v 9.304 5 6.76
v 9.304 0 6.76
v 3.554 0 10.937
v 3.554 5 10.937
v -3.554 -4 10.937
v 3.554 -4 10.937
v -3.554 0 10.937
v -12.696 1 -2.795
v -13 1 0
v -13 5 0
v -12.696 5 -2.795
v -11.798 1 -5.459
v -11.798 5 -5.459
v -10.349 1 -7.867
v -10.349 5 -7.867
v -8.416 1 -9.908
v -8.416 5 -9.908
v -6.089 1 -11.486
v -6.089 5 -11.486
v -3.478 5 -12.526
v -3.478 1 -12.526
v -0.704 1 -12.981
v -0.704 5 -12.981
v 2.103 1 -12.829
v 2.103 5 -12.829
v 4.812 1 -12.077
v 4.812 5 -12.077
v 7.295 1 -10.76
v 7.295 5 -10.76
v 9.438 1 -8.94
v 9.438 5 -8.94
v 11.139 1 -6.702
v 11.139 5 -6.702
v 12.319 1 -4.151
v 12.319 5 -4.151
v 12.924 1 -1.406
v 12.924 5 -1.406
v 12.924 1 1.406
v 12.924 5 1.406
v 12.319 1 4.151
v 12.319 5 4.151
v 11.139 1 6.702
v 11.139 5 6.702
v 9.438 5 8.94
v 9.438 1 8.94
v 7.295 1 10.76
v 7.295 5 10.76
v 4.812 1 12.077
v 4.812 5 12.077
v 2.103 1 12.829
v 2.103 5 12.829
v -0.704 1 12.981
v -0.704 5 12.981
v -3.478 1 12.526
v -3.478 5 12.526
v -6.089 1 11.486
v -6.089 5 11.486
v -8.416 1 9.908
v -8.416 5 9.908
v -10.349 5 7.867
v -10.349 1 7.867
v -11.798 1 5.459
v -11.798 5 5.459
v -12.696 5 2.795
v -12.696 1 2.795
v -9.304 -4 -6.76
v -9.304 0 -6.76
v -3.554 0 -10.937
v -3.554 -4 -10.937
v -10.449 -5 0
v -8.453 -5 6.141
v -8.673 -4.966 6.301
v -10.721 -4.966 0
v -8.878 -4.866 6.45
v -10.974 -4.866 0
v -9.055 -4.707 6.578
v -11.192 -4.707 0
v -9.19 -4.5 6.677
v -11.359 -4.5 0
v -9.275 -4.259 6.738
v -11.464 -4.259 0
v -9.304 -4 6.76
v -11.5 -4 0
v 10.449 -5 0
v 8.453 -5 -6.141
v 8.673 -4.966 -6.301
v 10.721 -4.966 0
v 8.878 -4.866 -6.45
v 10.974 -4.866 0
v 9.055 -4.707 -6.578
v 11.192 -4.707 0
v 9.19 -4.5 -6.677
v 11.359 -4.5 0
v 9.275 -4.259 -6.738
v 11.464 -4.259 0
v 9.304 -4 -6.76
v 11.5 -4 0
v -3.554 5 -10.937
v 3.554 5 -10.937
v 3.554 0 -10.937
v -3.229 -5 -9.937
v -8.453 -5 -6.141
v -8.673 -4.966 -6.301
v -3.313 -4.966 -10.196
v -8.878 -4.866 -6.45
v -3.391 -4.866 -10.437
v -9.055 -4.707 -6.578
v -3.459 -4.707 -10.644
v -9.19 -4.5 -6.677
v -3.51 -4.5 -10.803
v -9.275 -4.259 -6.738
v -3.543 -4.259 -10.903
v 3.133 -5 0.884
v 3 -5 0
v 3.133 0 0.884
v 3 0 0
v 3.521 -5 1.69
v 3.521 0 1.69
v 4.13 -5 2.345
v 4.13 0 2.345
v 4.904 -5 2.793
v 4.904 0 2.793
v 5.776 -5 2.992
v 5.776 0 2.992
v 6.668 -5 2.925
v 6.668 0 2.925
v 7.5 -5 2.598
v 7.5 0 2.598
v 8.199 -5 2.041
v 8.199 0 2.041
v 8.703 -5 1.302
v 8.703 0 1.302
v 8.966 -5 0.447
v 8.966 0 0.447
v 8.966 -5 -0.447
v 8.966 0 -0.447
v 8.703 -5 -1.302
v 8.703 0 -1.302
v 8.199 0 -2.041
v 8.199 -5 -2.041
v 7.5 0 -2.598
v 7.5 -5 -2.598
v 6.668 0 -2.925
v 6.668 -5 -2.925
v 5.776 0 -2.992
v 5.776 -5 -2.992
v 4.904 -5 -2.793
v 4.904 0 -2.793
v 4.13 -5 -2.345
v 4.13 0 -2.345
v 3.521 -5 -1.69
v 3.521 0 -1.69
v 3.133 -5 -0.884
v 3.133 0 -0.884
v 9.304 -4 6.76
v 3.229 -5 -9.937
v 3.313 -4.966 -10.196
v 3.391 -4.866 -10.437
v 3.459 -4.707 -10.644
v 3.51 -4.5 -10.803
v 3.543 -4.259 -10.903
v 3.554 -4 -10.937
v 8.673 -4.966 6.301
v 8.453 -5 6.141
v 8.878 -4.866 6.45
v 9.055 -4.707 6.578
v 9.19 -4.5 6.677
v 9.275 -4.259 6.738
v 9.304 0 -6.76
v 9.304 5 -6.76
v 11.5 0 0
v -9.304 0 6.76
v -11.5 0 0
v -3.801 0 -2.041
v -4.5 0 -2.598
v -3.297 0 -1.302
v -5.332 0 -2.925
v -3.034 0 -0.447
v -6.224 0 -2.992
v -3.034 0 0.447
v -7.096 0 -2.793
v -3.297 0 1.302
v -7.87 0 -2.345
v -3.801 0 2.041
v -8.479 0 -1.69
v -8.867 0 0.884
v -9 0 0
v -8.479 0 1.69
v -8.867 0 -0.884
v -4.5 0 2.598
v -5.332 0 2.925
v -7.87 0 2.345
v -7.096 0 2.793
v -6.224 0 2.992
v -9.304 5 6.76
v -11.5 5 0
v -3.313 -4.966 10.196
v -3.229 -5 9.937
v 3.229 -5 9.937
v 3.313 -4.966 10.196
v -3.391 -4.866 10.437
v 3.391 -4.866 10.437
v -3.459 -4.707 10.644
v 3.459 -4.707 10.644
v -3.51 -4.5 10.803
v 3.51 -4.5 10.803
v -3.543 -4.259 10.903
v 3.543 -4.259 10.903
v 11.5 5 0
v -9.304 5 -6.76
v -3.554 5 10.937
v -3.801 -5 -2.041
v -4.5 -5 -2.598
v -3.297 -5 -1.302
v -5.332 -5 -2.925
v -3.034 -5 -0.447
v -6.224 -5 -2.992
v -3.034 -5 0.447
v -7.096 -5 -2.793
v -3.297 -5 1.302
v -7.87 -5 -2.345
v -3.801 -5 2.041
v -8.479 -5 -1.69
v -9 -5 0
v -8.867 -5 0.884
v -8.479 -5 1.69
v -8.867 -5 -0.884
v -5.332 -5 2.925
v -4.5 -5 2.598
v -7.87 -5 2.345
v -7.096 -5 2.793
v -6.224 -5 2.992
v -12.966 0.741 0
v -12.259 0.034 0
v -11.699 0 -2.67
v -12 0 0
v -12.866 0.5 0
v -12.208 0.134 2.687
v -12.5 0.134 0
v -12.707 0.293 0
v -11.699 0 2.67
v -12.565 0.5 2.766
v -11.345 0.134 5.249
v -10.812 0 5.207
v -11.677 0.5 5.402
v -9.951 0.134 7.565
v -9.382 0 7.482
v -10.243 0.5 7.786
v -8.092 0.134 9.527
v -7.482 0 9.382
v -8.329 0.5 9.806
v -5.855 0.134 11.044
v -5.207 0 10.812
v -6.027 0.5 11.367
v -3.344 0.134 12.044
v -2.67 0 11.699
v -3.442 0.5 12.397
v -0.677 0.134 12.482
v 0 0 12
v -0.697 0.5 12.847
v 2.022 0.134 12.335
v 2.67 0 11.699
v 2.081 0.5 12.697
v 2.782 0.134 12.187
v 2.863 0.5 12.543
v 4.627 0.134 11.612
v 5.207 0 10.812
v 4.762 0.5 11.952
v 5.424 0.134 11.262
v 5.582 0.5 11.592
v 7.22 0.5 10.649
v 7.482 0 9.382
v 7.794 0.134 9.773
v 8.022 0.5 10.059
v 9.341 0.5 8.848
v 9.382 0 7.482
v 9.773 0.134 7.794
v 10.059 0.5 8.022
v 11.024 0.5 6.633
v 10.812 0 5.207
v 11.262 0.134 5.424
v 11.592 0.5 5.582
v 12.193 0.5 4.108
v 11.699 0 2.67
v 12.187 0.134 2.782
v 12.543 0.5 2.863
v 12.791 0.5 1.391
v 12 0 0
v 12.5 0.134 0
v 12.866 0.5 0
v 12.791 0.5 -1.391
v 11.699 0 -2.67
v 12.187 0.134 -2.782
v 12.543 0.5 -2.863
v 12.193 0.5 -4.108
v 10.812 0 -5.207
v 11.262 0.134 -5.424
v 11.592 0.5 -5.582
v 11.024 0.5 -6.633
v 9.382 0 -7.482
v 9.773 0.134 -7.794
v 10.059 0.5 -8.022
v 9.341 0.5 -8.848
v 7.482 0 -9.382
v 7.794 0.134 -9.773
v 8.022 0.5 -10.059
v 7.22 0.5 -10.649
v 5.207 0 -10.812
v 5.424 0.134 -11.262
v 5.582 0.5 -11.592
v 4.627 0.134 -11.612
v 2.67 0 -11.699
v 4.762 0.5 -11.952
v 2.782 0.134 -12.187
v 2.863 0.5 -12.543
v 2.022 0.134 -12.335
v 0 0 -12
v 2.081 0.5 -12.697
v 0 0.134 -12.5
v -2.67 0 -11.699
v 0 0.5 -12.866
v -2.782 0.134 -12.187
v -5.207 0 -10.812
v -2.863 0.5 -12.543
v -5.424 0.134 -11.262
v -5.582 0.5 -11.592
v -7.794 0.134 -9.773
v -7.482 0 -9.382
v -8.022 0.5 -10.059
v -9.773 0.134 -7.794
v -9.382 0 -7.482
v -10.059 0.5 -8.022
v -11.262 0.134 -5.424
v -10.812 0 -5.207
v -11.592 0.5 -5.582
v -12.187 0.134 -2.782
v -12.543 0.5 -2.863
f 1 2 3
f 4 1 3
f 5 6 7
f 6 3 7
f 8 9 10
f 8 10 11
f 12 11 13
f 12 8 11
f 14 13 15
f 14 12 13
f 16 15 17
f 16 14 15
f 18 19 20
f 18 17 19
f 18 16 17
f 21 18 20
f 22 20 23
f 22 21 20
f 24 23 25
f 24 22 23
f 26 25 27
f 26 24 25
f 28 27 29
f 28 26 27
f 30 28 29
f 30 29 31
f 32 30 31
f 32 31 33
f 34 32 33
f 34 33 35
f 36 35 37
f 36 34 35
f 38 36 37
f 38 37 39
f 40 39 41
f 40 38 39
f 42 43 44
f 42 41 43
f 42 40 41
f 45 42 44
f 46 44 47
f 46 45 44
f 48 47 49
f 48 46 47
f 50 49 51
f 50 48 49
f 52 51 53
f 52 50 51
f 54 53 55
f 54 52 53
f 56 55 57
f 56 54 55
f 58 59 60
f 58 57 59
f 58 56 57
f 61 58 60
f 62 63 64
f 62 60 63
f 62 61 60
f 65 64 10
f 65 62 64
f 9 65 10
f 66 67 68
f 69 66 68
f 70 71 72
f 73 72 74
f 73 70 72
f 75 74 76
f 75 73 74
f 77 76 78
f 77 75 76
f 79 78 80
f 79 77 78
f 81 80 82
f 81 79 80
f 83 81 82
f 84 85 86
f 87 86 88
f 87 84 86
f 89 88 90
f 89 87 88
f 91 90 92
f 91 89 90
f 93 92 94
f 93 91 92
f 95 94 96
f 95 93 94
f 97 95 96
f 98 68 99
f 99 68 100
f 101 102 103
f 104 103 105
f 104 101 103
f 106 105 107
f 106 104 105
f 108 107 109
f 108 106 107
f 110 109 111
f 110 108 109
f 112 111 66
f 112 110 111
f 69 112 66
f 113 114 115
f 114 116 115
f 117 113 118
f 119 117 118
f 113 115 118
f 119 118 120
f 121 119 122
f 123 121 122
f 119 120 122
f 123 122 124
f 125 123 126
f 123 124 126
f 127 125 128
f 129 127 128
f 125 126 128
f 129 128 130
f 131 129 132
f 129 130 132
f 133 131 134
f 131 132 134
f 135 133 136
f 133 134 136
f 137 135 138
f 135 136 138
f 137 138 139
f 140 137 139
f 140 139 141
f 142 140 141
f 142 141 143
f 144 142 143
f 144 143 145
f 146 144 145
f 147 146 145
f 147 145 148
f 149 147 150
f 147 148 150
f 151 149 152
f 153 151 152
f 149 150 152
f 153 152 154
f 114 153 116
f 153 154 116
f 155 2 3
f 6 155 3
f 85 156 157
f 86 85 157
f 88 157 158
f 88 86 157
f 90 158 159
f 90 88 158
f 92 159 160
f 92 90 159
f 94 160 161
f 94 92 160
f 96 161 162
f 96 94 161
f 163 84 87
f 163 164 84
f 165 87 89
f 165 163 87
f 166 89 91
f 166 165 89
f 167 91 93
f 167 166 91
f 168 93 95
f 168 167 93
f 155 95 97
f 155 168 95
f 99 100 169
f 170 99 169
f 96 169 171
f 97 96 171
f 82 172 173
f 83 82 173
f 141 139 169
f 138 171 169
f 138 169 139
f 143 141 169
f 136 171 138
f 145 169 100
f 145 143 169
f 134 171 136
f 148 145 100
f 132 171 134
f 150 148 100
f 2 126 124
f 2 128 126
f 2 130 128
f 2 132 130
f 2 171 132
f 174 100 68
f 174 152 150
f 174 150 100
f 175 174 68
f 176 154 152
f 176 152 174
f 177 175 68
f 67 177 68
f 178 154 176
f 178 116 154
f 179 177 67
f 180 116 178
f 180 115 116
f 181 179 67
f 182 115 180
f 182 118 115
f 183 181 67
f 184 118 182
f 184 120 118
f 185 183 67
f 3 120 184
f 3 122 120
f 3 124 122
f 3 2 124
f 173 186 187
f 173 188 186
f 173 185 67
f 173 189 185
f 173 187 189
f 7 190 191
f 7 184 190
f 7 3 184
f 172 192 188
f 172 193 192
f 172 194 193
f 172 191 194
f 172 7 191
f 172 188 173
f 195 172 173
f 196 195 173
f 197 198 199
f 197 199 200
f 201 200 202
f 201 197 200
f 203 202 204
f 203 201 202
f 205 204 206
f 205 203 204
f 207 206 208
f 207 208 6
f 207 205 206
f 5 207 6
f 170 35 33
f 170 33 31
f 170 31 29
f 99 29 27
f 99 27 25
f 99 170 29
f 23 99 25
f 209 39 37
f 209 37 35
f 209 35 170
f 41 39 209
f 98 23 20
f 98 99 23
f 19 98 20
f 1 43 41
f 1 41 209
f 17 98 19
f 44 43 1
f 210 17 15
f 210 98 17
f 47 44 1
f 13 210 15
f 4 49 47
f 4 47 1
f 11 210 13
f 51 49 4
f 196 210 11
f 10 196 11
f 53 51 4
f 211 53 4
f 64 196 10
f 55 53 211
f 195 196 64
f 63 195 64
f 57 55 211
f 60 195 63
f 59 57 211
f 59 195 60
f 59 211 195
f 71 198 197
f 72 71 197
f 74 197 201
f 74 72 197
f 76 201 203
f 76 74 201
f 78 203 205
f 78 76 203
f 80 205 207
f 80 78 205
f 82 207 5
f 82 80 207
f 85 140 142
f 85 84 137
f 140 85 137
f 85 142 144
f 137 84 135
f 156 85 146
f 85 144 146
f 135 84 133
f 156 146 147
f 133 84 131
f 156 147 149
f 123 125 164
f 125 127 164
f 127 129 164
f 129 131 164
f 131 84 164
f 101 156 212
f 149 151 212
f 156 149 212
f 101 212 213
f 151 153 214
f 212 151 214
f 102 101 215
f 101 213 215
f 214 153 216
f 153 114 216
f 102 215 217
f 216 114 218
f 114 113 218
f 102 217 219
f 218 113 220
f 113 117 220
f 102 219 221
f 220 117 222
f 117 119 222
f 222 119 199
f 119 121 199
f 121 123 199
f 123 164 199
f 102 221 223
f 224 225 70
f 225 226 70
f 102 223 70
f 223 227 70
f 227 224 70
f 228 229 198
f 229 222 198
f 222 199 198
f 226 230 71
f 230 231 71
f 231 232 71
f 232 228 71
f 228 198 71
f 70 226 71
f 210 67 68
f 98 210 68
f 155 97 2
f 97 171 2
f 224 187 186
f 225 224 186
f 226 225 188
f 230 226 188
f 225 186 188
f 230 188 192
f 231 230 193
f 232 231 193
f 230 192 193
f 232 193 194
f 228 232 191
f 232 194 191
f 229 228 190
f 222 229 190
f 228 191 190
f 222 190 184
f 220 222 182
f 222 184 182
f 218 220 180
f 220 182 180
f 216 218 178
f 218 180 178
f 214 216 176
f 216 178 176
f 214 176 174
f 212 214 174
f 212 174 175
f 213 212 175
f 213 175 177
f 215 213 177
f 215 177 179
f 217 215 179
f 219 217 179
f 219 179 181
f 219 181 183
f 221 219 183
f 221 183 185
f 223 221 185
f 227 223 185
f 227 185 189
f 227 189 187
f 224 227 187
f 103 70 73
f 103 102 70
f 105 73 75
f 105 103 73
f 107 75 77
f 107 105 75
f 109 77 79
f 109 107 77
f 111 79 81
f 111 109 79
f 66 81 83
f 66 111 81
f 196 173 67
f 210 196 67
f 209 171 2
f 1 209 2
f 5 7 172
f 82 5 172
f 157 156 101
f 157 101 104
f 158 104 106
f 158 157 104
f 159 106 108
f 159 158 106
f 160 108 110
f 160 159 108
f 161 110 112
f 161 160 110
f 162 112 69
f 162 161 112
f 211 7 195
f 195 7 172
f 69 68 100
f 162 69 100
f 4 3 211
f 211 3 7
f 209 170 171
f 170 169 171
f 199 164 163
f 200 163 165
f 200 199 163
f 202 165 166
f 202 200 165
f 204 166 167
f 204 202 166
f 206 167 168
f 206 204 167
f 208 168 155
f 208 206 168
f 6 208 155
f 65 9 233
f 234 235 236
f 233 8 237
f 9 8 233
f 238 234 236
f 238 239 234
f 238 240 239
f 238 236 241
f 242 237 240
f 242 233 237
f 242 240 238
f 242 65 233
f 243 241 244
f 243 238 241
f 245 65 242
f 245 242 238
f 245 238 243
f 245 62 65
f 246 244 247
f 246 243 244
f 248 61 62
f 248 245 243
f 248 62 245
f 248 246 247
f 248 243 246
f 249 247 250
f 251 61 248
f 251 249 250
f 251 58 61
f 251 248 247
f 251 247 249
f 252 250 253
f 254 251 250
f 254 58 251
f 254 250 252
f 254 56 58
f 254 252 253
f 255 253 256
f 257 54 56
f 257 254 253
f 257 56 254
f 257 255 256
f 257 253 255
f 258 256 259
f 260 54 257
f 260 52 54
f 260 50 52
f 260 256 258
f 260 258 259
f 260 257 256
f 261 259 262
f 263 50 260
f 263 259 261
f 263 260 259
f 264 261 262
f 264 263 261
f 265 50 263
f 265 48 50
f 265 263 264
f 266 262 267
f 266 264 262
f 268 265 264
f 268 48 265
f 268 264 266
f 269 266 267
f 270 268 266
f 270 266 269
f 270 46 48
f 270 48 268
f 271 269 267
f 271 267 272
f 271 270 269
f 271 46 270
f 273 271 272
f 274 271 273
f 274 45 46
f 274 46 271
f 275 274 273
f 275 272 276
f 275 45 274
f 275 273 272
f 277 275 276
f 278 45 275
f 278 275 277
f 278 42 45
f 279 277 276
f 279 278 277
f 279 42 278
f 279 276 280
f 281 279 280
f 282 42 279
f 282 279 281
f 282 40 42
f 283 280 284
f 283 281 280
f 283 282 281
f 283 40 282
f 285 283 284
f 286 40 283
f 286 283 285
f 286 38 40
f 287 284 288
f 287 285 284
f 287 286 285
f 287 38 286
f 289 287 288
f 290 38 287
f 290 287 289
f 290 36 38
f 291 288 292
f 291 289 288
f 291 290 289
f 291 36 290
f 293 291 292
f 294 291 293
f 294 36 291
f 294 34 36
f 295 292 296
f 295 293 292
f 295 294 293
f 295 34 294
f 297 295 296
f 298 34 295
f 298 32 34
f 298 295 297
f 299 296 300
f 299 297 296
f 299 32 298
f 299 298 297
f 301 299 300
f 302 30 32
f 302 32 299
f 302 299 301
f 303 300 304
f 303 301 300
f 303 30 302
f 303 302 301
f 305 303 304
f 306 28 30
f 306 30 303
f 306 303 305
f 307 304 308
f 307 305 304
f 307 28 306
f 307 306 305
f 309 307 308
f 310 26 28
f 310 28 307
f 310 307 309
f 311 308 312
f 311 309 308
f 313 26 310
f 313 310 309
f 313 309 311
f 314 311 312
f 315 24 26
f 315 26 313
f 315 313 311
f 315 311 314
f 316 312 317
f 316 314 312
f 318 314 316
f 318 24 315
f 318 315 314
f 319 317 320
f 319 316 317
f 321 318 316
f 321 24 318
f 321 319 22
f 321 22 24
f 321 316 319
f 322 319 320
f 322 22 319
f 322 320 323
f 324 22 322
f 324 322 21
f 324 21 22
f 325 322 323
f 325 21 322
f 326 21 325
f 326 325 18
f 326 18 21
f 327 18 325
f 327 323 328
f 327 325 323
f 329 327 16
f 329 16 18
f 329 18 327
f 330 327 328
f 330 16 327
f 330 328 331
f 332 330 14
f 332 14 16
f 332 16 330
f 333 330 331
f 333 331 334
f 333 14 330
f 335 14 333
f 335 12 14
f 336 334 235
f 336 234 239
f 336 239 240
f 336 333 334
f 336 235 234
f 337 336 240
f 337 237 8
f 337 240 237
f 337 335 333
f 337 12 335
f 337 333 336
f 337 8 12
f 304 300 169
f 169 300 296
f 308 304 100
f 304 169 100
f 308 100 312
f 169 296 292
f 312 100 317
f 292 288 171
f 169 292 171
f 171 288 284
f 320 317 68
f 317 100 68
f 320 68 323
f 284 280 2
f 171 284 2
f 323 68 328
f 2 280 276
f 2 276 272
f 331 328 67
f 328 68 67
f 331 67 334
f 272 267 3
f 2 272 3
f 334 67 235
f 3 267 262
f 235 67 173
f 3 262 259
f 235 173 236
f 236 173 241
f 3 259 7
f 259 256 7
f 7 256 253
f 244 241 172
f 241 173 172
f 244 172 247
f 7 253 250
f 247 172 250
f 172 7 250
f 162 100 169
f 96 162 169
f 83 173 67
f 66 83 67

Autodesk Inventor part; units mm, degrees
ref_plane "YZ Plane" through (0, 0, 0) normal (1, 0, 0) x (0, 1, 0)
ref_plane "XZ Plane" through (0, 0, 0) normal (0, 1, 0) x (-1, 0, 0)
ref_plane "XY Plane" through (0, 0, 0) normal (0, 0, 1) x (1, 0, 0)
sketch "Sketch1" plane through (0, 0, 0) normal (0, 1, 0) x (-1, 0, 0)
  circle A0 centre (0, 0) radius 13
  line L0 (-11.5, 0) -> (-9.3037, 6.7595)
  line L1 (-9.3037, 6.7595) -> (-3.5537, 10.9371)
  line L2 (-3.5537, 10.9371) -> (3.5537, 10.9371)
  line L3 (3.5537, 10.9371) -> (9.3037, 6.7595)
  line L4 (9.3037, 6.7595) -> (11.5, 0)
  line L5 (11.5, 0) -> (9.3037, -6.7595)
  line L6 (9.3037, -6.7595) -> (3.5537, -10.9371)
  line L7 (3.5537, -10.9371) -> (-3.5537, -10.9371)
  line L8 (-3.5537, -10.9371) -> (-9.3037, -6.7595)
  line L9 (-9.3037, -6.7595) -> (-11.5, 0)
  circle A1 centre (-6, 0) radius 3
  circle A2 centre (6, 0) radius 3
  dimension "d0" = 26
  dimension "d10" = 6
  dimension "d11" = 6
extrude "Extrusion1" add sketch "Sketch1" against normal blind 5 contours L0 L1 L2 L3 L4 L5 L6 L7 L8 L9
extrude "Extrusion2" add sketch "Sketch1" along normal blind 5 contours A0
fillet "Fillet1" radius 1 11 edges at (13, 0, 0) (-6.4287, -5, -8.8483) (0, -5, -10.9371) (-10.4018, -5, -3.3798) (-10.4018, -5, 3.3798) (-6.4287, -5, 8.8483) (0, -5, 10.9371) (6.4287, -5, 8.8483) (10.4018, -5, 3.3798) (10.4018, -5, -3.3798) (6.4287, -5, -8.8483)
properties part number "Probe P1"
